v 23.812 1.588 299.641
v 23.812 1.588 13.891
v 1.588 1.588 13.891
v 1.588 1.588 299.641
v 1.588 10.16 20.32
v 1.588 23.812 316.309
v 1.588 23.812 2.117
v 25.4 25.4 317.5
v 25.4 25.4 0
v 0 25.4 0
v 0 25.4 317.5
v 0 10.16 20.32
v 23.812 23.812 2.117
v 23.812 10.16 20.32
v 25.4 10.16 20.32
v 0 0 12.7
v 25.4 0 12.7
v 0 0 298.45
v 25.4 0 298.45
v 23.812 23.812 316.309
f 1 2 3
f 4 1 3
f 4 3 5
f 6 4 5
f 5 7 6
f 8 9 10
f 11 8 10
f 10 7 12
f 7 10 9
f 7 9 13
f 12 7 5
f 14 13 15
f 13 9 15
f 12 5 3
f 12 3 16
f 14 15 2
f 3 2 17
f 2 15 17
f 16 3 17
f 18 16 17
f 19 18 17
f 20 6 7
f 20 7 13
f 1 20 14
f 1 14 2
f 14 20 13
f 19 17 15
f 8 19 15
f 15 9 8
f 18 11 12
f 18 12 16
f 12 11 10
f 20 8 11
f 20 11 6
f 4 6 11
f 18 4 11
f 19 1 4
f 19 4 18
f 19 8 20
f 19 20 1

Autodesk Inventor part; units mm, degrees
ref_plane "YZ Plane" through (0, 0, 0) normal (1, 0, 0) x (0, 1, 0)
ref_plane "XZ Plane" through (0, 0, 0) normal (0, 1, 0) x (-1, 0, 0)
ref_plane "XY Plane" through (0, 0, 0) normal (0, 0, 1) x (1, 0, 0)
sketch "Sketch1" plane through (0, 0, 0) normal (0, 0, 1) x (1, 0, 0)
  line L0 (0, 0) -> (25.4, 0)
  line L1 (25.4, 0) -> (25.4, 25.4)
  line L2 (25.4, 25.4) -> (0, 25.4)
  line L3 (0, 25.4) -> (0, 0)
  line L4 (1.5875, 23.8125) -> (23.8125, 23.8125)
  line L5 (23.8125, 23.8125) -> (23.8125, 1.5875)
  line L6 (23.8125, 1.5875) -> (1.5875, 1.5875)
  line L7 (1.5875, 1.5875) -> (1.5875, 23.8125)
  dimension "d0" = 25.4
  dimension "d1" = 25.4
  dimension "d2" = 1.5875
extrude "Extrusion1" add sketch "Sketch1" along normal blind 317.5
sketch "Sketch2" plane through (25.4, 0, 0) normal (1, 0, 0) x (0, 0, -1)
  line L0 (0, 0) -> (0, 25.4) projected
  line L1 (0, 25.4) -> (0, 0)
  line L2 (0, 25.4) -> (-317.5, 25.4) projected
  line L3 (-317.5, 25.4) -> (-298.45, 0)
  line L4 (-317.5, 23.8125) -> (-317.5, 1.5875) projected
  line L5 (-298.45, 0) -> (-317.5, 0)
  line L6 (-317.5, 0) -> (-317.5, 25.4) projected
  line L7 (-317.5, 25.4) -> (-317.5, 0)
  line L8 (0, 25.4) -> (-20.32, 10.16)
  line L9 (-20.32, 10.16) -> (-12.7, 0)
  line L10 (0, 0) -> (-317.5, 0) projected
  line L11 (-12.7, 0) -> (0, 0)
  dimension "d6" = 36.87
  dimension "d9" = 53.13
  dimension "d10" = 25.4
extrude "Extrusion3" cut sketch "Sketch2" against normal blind 25.4 contours L10 L9 L8 L0 | L3 L5 L6 L4
properties part number "angle support" material "Aluminum 6061"
